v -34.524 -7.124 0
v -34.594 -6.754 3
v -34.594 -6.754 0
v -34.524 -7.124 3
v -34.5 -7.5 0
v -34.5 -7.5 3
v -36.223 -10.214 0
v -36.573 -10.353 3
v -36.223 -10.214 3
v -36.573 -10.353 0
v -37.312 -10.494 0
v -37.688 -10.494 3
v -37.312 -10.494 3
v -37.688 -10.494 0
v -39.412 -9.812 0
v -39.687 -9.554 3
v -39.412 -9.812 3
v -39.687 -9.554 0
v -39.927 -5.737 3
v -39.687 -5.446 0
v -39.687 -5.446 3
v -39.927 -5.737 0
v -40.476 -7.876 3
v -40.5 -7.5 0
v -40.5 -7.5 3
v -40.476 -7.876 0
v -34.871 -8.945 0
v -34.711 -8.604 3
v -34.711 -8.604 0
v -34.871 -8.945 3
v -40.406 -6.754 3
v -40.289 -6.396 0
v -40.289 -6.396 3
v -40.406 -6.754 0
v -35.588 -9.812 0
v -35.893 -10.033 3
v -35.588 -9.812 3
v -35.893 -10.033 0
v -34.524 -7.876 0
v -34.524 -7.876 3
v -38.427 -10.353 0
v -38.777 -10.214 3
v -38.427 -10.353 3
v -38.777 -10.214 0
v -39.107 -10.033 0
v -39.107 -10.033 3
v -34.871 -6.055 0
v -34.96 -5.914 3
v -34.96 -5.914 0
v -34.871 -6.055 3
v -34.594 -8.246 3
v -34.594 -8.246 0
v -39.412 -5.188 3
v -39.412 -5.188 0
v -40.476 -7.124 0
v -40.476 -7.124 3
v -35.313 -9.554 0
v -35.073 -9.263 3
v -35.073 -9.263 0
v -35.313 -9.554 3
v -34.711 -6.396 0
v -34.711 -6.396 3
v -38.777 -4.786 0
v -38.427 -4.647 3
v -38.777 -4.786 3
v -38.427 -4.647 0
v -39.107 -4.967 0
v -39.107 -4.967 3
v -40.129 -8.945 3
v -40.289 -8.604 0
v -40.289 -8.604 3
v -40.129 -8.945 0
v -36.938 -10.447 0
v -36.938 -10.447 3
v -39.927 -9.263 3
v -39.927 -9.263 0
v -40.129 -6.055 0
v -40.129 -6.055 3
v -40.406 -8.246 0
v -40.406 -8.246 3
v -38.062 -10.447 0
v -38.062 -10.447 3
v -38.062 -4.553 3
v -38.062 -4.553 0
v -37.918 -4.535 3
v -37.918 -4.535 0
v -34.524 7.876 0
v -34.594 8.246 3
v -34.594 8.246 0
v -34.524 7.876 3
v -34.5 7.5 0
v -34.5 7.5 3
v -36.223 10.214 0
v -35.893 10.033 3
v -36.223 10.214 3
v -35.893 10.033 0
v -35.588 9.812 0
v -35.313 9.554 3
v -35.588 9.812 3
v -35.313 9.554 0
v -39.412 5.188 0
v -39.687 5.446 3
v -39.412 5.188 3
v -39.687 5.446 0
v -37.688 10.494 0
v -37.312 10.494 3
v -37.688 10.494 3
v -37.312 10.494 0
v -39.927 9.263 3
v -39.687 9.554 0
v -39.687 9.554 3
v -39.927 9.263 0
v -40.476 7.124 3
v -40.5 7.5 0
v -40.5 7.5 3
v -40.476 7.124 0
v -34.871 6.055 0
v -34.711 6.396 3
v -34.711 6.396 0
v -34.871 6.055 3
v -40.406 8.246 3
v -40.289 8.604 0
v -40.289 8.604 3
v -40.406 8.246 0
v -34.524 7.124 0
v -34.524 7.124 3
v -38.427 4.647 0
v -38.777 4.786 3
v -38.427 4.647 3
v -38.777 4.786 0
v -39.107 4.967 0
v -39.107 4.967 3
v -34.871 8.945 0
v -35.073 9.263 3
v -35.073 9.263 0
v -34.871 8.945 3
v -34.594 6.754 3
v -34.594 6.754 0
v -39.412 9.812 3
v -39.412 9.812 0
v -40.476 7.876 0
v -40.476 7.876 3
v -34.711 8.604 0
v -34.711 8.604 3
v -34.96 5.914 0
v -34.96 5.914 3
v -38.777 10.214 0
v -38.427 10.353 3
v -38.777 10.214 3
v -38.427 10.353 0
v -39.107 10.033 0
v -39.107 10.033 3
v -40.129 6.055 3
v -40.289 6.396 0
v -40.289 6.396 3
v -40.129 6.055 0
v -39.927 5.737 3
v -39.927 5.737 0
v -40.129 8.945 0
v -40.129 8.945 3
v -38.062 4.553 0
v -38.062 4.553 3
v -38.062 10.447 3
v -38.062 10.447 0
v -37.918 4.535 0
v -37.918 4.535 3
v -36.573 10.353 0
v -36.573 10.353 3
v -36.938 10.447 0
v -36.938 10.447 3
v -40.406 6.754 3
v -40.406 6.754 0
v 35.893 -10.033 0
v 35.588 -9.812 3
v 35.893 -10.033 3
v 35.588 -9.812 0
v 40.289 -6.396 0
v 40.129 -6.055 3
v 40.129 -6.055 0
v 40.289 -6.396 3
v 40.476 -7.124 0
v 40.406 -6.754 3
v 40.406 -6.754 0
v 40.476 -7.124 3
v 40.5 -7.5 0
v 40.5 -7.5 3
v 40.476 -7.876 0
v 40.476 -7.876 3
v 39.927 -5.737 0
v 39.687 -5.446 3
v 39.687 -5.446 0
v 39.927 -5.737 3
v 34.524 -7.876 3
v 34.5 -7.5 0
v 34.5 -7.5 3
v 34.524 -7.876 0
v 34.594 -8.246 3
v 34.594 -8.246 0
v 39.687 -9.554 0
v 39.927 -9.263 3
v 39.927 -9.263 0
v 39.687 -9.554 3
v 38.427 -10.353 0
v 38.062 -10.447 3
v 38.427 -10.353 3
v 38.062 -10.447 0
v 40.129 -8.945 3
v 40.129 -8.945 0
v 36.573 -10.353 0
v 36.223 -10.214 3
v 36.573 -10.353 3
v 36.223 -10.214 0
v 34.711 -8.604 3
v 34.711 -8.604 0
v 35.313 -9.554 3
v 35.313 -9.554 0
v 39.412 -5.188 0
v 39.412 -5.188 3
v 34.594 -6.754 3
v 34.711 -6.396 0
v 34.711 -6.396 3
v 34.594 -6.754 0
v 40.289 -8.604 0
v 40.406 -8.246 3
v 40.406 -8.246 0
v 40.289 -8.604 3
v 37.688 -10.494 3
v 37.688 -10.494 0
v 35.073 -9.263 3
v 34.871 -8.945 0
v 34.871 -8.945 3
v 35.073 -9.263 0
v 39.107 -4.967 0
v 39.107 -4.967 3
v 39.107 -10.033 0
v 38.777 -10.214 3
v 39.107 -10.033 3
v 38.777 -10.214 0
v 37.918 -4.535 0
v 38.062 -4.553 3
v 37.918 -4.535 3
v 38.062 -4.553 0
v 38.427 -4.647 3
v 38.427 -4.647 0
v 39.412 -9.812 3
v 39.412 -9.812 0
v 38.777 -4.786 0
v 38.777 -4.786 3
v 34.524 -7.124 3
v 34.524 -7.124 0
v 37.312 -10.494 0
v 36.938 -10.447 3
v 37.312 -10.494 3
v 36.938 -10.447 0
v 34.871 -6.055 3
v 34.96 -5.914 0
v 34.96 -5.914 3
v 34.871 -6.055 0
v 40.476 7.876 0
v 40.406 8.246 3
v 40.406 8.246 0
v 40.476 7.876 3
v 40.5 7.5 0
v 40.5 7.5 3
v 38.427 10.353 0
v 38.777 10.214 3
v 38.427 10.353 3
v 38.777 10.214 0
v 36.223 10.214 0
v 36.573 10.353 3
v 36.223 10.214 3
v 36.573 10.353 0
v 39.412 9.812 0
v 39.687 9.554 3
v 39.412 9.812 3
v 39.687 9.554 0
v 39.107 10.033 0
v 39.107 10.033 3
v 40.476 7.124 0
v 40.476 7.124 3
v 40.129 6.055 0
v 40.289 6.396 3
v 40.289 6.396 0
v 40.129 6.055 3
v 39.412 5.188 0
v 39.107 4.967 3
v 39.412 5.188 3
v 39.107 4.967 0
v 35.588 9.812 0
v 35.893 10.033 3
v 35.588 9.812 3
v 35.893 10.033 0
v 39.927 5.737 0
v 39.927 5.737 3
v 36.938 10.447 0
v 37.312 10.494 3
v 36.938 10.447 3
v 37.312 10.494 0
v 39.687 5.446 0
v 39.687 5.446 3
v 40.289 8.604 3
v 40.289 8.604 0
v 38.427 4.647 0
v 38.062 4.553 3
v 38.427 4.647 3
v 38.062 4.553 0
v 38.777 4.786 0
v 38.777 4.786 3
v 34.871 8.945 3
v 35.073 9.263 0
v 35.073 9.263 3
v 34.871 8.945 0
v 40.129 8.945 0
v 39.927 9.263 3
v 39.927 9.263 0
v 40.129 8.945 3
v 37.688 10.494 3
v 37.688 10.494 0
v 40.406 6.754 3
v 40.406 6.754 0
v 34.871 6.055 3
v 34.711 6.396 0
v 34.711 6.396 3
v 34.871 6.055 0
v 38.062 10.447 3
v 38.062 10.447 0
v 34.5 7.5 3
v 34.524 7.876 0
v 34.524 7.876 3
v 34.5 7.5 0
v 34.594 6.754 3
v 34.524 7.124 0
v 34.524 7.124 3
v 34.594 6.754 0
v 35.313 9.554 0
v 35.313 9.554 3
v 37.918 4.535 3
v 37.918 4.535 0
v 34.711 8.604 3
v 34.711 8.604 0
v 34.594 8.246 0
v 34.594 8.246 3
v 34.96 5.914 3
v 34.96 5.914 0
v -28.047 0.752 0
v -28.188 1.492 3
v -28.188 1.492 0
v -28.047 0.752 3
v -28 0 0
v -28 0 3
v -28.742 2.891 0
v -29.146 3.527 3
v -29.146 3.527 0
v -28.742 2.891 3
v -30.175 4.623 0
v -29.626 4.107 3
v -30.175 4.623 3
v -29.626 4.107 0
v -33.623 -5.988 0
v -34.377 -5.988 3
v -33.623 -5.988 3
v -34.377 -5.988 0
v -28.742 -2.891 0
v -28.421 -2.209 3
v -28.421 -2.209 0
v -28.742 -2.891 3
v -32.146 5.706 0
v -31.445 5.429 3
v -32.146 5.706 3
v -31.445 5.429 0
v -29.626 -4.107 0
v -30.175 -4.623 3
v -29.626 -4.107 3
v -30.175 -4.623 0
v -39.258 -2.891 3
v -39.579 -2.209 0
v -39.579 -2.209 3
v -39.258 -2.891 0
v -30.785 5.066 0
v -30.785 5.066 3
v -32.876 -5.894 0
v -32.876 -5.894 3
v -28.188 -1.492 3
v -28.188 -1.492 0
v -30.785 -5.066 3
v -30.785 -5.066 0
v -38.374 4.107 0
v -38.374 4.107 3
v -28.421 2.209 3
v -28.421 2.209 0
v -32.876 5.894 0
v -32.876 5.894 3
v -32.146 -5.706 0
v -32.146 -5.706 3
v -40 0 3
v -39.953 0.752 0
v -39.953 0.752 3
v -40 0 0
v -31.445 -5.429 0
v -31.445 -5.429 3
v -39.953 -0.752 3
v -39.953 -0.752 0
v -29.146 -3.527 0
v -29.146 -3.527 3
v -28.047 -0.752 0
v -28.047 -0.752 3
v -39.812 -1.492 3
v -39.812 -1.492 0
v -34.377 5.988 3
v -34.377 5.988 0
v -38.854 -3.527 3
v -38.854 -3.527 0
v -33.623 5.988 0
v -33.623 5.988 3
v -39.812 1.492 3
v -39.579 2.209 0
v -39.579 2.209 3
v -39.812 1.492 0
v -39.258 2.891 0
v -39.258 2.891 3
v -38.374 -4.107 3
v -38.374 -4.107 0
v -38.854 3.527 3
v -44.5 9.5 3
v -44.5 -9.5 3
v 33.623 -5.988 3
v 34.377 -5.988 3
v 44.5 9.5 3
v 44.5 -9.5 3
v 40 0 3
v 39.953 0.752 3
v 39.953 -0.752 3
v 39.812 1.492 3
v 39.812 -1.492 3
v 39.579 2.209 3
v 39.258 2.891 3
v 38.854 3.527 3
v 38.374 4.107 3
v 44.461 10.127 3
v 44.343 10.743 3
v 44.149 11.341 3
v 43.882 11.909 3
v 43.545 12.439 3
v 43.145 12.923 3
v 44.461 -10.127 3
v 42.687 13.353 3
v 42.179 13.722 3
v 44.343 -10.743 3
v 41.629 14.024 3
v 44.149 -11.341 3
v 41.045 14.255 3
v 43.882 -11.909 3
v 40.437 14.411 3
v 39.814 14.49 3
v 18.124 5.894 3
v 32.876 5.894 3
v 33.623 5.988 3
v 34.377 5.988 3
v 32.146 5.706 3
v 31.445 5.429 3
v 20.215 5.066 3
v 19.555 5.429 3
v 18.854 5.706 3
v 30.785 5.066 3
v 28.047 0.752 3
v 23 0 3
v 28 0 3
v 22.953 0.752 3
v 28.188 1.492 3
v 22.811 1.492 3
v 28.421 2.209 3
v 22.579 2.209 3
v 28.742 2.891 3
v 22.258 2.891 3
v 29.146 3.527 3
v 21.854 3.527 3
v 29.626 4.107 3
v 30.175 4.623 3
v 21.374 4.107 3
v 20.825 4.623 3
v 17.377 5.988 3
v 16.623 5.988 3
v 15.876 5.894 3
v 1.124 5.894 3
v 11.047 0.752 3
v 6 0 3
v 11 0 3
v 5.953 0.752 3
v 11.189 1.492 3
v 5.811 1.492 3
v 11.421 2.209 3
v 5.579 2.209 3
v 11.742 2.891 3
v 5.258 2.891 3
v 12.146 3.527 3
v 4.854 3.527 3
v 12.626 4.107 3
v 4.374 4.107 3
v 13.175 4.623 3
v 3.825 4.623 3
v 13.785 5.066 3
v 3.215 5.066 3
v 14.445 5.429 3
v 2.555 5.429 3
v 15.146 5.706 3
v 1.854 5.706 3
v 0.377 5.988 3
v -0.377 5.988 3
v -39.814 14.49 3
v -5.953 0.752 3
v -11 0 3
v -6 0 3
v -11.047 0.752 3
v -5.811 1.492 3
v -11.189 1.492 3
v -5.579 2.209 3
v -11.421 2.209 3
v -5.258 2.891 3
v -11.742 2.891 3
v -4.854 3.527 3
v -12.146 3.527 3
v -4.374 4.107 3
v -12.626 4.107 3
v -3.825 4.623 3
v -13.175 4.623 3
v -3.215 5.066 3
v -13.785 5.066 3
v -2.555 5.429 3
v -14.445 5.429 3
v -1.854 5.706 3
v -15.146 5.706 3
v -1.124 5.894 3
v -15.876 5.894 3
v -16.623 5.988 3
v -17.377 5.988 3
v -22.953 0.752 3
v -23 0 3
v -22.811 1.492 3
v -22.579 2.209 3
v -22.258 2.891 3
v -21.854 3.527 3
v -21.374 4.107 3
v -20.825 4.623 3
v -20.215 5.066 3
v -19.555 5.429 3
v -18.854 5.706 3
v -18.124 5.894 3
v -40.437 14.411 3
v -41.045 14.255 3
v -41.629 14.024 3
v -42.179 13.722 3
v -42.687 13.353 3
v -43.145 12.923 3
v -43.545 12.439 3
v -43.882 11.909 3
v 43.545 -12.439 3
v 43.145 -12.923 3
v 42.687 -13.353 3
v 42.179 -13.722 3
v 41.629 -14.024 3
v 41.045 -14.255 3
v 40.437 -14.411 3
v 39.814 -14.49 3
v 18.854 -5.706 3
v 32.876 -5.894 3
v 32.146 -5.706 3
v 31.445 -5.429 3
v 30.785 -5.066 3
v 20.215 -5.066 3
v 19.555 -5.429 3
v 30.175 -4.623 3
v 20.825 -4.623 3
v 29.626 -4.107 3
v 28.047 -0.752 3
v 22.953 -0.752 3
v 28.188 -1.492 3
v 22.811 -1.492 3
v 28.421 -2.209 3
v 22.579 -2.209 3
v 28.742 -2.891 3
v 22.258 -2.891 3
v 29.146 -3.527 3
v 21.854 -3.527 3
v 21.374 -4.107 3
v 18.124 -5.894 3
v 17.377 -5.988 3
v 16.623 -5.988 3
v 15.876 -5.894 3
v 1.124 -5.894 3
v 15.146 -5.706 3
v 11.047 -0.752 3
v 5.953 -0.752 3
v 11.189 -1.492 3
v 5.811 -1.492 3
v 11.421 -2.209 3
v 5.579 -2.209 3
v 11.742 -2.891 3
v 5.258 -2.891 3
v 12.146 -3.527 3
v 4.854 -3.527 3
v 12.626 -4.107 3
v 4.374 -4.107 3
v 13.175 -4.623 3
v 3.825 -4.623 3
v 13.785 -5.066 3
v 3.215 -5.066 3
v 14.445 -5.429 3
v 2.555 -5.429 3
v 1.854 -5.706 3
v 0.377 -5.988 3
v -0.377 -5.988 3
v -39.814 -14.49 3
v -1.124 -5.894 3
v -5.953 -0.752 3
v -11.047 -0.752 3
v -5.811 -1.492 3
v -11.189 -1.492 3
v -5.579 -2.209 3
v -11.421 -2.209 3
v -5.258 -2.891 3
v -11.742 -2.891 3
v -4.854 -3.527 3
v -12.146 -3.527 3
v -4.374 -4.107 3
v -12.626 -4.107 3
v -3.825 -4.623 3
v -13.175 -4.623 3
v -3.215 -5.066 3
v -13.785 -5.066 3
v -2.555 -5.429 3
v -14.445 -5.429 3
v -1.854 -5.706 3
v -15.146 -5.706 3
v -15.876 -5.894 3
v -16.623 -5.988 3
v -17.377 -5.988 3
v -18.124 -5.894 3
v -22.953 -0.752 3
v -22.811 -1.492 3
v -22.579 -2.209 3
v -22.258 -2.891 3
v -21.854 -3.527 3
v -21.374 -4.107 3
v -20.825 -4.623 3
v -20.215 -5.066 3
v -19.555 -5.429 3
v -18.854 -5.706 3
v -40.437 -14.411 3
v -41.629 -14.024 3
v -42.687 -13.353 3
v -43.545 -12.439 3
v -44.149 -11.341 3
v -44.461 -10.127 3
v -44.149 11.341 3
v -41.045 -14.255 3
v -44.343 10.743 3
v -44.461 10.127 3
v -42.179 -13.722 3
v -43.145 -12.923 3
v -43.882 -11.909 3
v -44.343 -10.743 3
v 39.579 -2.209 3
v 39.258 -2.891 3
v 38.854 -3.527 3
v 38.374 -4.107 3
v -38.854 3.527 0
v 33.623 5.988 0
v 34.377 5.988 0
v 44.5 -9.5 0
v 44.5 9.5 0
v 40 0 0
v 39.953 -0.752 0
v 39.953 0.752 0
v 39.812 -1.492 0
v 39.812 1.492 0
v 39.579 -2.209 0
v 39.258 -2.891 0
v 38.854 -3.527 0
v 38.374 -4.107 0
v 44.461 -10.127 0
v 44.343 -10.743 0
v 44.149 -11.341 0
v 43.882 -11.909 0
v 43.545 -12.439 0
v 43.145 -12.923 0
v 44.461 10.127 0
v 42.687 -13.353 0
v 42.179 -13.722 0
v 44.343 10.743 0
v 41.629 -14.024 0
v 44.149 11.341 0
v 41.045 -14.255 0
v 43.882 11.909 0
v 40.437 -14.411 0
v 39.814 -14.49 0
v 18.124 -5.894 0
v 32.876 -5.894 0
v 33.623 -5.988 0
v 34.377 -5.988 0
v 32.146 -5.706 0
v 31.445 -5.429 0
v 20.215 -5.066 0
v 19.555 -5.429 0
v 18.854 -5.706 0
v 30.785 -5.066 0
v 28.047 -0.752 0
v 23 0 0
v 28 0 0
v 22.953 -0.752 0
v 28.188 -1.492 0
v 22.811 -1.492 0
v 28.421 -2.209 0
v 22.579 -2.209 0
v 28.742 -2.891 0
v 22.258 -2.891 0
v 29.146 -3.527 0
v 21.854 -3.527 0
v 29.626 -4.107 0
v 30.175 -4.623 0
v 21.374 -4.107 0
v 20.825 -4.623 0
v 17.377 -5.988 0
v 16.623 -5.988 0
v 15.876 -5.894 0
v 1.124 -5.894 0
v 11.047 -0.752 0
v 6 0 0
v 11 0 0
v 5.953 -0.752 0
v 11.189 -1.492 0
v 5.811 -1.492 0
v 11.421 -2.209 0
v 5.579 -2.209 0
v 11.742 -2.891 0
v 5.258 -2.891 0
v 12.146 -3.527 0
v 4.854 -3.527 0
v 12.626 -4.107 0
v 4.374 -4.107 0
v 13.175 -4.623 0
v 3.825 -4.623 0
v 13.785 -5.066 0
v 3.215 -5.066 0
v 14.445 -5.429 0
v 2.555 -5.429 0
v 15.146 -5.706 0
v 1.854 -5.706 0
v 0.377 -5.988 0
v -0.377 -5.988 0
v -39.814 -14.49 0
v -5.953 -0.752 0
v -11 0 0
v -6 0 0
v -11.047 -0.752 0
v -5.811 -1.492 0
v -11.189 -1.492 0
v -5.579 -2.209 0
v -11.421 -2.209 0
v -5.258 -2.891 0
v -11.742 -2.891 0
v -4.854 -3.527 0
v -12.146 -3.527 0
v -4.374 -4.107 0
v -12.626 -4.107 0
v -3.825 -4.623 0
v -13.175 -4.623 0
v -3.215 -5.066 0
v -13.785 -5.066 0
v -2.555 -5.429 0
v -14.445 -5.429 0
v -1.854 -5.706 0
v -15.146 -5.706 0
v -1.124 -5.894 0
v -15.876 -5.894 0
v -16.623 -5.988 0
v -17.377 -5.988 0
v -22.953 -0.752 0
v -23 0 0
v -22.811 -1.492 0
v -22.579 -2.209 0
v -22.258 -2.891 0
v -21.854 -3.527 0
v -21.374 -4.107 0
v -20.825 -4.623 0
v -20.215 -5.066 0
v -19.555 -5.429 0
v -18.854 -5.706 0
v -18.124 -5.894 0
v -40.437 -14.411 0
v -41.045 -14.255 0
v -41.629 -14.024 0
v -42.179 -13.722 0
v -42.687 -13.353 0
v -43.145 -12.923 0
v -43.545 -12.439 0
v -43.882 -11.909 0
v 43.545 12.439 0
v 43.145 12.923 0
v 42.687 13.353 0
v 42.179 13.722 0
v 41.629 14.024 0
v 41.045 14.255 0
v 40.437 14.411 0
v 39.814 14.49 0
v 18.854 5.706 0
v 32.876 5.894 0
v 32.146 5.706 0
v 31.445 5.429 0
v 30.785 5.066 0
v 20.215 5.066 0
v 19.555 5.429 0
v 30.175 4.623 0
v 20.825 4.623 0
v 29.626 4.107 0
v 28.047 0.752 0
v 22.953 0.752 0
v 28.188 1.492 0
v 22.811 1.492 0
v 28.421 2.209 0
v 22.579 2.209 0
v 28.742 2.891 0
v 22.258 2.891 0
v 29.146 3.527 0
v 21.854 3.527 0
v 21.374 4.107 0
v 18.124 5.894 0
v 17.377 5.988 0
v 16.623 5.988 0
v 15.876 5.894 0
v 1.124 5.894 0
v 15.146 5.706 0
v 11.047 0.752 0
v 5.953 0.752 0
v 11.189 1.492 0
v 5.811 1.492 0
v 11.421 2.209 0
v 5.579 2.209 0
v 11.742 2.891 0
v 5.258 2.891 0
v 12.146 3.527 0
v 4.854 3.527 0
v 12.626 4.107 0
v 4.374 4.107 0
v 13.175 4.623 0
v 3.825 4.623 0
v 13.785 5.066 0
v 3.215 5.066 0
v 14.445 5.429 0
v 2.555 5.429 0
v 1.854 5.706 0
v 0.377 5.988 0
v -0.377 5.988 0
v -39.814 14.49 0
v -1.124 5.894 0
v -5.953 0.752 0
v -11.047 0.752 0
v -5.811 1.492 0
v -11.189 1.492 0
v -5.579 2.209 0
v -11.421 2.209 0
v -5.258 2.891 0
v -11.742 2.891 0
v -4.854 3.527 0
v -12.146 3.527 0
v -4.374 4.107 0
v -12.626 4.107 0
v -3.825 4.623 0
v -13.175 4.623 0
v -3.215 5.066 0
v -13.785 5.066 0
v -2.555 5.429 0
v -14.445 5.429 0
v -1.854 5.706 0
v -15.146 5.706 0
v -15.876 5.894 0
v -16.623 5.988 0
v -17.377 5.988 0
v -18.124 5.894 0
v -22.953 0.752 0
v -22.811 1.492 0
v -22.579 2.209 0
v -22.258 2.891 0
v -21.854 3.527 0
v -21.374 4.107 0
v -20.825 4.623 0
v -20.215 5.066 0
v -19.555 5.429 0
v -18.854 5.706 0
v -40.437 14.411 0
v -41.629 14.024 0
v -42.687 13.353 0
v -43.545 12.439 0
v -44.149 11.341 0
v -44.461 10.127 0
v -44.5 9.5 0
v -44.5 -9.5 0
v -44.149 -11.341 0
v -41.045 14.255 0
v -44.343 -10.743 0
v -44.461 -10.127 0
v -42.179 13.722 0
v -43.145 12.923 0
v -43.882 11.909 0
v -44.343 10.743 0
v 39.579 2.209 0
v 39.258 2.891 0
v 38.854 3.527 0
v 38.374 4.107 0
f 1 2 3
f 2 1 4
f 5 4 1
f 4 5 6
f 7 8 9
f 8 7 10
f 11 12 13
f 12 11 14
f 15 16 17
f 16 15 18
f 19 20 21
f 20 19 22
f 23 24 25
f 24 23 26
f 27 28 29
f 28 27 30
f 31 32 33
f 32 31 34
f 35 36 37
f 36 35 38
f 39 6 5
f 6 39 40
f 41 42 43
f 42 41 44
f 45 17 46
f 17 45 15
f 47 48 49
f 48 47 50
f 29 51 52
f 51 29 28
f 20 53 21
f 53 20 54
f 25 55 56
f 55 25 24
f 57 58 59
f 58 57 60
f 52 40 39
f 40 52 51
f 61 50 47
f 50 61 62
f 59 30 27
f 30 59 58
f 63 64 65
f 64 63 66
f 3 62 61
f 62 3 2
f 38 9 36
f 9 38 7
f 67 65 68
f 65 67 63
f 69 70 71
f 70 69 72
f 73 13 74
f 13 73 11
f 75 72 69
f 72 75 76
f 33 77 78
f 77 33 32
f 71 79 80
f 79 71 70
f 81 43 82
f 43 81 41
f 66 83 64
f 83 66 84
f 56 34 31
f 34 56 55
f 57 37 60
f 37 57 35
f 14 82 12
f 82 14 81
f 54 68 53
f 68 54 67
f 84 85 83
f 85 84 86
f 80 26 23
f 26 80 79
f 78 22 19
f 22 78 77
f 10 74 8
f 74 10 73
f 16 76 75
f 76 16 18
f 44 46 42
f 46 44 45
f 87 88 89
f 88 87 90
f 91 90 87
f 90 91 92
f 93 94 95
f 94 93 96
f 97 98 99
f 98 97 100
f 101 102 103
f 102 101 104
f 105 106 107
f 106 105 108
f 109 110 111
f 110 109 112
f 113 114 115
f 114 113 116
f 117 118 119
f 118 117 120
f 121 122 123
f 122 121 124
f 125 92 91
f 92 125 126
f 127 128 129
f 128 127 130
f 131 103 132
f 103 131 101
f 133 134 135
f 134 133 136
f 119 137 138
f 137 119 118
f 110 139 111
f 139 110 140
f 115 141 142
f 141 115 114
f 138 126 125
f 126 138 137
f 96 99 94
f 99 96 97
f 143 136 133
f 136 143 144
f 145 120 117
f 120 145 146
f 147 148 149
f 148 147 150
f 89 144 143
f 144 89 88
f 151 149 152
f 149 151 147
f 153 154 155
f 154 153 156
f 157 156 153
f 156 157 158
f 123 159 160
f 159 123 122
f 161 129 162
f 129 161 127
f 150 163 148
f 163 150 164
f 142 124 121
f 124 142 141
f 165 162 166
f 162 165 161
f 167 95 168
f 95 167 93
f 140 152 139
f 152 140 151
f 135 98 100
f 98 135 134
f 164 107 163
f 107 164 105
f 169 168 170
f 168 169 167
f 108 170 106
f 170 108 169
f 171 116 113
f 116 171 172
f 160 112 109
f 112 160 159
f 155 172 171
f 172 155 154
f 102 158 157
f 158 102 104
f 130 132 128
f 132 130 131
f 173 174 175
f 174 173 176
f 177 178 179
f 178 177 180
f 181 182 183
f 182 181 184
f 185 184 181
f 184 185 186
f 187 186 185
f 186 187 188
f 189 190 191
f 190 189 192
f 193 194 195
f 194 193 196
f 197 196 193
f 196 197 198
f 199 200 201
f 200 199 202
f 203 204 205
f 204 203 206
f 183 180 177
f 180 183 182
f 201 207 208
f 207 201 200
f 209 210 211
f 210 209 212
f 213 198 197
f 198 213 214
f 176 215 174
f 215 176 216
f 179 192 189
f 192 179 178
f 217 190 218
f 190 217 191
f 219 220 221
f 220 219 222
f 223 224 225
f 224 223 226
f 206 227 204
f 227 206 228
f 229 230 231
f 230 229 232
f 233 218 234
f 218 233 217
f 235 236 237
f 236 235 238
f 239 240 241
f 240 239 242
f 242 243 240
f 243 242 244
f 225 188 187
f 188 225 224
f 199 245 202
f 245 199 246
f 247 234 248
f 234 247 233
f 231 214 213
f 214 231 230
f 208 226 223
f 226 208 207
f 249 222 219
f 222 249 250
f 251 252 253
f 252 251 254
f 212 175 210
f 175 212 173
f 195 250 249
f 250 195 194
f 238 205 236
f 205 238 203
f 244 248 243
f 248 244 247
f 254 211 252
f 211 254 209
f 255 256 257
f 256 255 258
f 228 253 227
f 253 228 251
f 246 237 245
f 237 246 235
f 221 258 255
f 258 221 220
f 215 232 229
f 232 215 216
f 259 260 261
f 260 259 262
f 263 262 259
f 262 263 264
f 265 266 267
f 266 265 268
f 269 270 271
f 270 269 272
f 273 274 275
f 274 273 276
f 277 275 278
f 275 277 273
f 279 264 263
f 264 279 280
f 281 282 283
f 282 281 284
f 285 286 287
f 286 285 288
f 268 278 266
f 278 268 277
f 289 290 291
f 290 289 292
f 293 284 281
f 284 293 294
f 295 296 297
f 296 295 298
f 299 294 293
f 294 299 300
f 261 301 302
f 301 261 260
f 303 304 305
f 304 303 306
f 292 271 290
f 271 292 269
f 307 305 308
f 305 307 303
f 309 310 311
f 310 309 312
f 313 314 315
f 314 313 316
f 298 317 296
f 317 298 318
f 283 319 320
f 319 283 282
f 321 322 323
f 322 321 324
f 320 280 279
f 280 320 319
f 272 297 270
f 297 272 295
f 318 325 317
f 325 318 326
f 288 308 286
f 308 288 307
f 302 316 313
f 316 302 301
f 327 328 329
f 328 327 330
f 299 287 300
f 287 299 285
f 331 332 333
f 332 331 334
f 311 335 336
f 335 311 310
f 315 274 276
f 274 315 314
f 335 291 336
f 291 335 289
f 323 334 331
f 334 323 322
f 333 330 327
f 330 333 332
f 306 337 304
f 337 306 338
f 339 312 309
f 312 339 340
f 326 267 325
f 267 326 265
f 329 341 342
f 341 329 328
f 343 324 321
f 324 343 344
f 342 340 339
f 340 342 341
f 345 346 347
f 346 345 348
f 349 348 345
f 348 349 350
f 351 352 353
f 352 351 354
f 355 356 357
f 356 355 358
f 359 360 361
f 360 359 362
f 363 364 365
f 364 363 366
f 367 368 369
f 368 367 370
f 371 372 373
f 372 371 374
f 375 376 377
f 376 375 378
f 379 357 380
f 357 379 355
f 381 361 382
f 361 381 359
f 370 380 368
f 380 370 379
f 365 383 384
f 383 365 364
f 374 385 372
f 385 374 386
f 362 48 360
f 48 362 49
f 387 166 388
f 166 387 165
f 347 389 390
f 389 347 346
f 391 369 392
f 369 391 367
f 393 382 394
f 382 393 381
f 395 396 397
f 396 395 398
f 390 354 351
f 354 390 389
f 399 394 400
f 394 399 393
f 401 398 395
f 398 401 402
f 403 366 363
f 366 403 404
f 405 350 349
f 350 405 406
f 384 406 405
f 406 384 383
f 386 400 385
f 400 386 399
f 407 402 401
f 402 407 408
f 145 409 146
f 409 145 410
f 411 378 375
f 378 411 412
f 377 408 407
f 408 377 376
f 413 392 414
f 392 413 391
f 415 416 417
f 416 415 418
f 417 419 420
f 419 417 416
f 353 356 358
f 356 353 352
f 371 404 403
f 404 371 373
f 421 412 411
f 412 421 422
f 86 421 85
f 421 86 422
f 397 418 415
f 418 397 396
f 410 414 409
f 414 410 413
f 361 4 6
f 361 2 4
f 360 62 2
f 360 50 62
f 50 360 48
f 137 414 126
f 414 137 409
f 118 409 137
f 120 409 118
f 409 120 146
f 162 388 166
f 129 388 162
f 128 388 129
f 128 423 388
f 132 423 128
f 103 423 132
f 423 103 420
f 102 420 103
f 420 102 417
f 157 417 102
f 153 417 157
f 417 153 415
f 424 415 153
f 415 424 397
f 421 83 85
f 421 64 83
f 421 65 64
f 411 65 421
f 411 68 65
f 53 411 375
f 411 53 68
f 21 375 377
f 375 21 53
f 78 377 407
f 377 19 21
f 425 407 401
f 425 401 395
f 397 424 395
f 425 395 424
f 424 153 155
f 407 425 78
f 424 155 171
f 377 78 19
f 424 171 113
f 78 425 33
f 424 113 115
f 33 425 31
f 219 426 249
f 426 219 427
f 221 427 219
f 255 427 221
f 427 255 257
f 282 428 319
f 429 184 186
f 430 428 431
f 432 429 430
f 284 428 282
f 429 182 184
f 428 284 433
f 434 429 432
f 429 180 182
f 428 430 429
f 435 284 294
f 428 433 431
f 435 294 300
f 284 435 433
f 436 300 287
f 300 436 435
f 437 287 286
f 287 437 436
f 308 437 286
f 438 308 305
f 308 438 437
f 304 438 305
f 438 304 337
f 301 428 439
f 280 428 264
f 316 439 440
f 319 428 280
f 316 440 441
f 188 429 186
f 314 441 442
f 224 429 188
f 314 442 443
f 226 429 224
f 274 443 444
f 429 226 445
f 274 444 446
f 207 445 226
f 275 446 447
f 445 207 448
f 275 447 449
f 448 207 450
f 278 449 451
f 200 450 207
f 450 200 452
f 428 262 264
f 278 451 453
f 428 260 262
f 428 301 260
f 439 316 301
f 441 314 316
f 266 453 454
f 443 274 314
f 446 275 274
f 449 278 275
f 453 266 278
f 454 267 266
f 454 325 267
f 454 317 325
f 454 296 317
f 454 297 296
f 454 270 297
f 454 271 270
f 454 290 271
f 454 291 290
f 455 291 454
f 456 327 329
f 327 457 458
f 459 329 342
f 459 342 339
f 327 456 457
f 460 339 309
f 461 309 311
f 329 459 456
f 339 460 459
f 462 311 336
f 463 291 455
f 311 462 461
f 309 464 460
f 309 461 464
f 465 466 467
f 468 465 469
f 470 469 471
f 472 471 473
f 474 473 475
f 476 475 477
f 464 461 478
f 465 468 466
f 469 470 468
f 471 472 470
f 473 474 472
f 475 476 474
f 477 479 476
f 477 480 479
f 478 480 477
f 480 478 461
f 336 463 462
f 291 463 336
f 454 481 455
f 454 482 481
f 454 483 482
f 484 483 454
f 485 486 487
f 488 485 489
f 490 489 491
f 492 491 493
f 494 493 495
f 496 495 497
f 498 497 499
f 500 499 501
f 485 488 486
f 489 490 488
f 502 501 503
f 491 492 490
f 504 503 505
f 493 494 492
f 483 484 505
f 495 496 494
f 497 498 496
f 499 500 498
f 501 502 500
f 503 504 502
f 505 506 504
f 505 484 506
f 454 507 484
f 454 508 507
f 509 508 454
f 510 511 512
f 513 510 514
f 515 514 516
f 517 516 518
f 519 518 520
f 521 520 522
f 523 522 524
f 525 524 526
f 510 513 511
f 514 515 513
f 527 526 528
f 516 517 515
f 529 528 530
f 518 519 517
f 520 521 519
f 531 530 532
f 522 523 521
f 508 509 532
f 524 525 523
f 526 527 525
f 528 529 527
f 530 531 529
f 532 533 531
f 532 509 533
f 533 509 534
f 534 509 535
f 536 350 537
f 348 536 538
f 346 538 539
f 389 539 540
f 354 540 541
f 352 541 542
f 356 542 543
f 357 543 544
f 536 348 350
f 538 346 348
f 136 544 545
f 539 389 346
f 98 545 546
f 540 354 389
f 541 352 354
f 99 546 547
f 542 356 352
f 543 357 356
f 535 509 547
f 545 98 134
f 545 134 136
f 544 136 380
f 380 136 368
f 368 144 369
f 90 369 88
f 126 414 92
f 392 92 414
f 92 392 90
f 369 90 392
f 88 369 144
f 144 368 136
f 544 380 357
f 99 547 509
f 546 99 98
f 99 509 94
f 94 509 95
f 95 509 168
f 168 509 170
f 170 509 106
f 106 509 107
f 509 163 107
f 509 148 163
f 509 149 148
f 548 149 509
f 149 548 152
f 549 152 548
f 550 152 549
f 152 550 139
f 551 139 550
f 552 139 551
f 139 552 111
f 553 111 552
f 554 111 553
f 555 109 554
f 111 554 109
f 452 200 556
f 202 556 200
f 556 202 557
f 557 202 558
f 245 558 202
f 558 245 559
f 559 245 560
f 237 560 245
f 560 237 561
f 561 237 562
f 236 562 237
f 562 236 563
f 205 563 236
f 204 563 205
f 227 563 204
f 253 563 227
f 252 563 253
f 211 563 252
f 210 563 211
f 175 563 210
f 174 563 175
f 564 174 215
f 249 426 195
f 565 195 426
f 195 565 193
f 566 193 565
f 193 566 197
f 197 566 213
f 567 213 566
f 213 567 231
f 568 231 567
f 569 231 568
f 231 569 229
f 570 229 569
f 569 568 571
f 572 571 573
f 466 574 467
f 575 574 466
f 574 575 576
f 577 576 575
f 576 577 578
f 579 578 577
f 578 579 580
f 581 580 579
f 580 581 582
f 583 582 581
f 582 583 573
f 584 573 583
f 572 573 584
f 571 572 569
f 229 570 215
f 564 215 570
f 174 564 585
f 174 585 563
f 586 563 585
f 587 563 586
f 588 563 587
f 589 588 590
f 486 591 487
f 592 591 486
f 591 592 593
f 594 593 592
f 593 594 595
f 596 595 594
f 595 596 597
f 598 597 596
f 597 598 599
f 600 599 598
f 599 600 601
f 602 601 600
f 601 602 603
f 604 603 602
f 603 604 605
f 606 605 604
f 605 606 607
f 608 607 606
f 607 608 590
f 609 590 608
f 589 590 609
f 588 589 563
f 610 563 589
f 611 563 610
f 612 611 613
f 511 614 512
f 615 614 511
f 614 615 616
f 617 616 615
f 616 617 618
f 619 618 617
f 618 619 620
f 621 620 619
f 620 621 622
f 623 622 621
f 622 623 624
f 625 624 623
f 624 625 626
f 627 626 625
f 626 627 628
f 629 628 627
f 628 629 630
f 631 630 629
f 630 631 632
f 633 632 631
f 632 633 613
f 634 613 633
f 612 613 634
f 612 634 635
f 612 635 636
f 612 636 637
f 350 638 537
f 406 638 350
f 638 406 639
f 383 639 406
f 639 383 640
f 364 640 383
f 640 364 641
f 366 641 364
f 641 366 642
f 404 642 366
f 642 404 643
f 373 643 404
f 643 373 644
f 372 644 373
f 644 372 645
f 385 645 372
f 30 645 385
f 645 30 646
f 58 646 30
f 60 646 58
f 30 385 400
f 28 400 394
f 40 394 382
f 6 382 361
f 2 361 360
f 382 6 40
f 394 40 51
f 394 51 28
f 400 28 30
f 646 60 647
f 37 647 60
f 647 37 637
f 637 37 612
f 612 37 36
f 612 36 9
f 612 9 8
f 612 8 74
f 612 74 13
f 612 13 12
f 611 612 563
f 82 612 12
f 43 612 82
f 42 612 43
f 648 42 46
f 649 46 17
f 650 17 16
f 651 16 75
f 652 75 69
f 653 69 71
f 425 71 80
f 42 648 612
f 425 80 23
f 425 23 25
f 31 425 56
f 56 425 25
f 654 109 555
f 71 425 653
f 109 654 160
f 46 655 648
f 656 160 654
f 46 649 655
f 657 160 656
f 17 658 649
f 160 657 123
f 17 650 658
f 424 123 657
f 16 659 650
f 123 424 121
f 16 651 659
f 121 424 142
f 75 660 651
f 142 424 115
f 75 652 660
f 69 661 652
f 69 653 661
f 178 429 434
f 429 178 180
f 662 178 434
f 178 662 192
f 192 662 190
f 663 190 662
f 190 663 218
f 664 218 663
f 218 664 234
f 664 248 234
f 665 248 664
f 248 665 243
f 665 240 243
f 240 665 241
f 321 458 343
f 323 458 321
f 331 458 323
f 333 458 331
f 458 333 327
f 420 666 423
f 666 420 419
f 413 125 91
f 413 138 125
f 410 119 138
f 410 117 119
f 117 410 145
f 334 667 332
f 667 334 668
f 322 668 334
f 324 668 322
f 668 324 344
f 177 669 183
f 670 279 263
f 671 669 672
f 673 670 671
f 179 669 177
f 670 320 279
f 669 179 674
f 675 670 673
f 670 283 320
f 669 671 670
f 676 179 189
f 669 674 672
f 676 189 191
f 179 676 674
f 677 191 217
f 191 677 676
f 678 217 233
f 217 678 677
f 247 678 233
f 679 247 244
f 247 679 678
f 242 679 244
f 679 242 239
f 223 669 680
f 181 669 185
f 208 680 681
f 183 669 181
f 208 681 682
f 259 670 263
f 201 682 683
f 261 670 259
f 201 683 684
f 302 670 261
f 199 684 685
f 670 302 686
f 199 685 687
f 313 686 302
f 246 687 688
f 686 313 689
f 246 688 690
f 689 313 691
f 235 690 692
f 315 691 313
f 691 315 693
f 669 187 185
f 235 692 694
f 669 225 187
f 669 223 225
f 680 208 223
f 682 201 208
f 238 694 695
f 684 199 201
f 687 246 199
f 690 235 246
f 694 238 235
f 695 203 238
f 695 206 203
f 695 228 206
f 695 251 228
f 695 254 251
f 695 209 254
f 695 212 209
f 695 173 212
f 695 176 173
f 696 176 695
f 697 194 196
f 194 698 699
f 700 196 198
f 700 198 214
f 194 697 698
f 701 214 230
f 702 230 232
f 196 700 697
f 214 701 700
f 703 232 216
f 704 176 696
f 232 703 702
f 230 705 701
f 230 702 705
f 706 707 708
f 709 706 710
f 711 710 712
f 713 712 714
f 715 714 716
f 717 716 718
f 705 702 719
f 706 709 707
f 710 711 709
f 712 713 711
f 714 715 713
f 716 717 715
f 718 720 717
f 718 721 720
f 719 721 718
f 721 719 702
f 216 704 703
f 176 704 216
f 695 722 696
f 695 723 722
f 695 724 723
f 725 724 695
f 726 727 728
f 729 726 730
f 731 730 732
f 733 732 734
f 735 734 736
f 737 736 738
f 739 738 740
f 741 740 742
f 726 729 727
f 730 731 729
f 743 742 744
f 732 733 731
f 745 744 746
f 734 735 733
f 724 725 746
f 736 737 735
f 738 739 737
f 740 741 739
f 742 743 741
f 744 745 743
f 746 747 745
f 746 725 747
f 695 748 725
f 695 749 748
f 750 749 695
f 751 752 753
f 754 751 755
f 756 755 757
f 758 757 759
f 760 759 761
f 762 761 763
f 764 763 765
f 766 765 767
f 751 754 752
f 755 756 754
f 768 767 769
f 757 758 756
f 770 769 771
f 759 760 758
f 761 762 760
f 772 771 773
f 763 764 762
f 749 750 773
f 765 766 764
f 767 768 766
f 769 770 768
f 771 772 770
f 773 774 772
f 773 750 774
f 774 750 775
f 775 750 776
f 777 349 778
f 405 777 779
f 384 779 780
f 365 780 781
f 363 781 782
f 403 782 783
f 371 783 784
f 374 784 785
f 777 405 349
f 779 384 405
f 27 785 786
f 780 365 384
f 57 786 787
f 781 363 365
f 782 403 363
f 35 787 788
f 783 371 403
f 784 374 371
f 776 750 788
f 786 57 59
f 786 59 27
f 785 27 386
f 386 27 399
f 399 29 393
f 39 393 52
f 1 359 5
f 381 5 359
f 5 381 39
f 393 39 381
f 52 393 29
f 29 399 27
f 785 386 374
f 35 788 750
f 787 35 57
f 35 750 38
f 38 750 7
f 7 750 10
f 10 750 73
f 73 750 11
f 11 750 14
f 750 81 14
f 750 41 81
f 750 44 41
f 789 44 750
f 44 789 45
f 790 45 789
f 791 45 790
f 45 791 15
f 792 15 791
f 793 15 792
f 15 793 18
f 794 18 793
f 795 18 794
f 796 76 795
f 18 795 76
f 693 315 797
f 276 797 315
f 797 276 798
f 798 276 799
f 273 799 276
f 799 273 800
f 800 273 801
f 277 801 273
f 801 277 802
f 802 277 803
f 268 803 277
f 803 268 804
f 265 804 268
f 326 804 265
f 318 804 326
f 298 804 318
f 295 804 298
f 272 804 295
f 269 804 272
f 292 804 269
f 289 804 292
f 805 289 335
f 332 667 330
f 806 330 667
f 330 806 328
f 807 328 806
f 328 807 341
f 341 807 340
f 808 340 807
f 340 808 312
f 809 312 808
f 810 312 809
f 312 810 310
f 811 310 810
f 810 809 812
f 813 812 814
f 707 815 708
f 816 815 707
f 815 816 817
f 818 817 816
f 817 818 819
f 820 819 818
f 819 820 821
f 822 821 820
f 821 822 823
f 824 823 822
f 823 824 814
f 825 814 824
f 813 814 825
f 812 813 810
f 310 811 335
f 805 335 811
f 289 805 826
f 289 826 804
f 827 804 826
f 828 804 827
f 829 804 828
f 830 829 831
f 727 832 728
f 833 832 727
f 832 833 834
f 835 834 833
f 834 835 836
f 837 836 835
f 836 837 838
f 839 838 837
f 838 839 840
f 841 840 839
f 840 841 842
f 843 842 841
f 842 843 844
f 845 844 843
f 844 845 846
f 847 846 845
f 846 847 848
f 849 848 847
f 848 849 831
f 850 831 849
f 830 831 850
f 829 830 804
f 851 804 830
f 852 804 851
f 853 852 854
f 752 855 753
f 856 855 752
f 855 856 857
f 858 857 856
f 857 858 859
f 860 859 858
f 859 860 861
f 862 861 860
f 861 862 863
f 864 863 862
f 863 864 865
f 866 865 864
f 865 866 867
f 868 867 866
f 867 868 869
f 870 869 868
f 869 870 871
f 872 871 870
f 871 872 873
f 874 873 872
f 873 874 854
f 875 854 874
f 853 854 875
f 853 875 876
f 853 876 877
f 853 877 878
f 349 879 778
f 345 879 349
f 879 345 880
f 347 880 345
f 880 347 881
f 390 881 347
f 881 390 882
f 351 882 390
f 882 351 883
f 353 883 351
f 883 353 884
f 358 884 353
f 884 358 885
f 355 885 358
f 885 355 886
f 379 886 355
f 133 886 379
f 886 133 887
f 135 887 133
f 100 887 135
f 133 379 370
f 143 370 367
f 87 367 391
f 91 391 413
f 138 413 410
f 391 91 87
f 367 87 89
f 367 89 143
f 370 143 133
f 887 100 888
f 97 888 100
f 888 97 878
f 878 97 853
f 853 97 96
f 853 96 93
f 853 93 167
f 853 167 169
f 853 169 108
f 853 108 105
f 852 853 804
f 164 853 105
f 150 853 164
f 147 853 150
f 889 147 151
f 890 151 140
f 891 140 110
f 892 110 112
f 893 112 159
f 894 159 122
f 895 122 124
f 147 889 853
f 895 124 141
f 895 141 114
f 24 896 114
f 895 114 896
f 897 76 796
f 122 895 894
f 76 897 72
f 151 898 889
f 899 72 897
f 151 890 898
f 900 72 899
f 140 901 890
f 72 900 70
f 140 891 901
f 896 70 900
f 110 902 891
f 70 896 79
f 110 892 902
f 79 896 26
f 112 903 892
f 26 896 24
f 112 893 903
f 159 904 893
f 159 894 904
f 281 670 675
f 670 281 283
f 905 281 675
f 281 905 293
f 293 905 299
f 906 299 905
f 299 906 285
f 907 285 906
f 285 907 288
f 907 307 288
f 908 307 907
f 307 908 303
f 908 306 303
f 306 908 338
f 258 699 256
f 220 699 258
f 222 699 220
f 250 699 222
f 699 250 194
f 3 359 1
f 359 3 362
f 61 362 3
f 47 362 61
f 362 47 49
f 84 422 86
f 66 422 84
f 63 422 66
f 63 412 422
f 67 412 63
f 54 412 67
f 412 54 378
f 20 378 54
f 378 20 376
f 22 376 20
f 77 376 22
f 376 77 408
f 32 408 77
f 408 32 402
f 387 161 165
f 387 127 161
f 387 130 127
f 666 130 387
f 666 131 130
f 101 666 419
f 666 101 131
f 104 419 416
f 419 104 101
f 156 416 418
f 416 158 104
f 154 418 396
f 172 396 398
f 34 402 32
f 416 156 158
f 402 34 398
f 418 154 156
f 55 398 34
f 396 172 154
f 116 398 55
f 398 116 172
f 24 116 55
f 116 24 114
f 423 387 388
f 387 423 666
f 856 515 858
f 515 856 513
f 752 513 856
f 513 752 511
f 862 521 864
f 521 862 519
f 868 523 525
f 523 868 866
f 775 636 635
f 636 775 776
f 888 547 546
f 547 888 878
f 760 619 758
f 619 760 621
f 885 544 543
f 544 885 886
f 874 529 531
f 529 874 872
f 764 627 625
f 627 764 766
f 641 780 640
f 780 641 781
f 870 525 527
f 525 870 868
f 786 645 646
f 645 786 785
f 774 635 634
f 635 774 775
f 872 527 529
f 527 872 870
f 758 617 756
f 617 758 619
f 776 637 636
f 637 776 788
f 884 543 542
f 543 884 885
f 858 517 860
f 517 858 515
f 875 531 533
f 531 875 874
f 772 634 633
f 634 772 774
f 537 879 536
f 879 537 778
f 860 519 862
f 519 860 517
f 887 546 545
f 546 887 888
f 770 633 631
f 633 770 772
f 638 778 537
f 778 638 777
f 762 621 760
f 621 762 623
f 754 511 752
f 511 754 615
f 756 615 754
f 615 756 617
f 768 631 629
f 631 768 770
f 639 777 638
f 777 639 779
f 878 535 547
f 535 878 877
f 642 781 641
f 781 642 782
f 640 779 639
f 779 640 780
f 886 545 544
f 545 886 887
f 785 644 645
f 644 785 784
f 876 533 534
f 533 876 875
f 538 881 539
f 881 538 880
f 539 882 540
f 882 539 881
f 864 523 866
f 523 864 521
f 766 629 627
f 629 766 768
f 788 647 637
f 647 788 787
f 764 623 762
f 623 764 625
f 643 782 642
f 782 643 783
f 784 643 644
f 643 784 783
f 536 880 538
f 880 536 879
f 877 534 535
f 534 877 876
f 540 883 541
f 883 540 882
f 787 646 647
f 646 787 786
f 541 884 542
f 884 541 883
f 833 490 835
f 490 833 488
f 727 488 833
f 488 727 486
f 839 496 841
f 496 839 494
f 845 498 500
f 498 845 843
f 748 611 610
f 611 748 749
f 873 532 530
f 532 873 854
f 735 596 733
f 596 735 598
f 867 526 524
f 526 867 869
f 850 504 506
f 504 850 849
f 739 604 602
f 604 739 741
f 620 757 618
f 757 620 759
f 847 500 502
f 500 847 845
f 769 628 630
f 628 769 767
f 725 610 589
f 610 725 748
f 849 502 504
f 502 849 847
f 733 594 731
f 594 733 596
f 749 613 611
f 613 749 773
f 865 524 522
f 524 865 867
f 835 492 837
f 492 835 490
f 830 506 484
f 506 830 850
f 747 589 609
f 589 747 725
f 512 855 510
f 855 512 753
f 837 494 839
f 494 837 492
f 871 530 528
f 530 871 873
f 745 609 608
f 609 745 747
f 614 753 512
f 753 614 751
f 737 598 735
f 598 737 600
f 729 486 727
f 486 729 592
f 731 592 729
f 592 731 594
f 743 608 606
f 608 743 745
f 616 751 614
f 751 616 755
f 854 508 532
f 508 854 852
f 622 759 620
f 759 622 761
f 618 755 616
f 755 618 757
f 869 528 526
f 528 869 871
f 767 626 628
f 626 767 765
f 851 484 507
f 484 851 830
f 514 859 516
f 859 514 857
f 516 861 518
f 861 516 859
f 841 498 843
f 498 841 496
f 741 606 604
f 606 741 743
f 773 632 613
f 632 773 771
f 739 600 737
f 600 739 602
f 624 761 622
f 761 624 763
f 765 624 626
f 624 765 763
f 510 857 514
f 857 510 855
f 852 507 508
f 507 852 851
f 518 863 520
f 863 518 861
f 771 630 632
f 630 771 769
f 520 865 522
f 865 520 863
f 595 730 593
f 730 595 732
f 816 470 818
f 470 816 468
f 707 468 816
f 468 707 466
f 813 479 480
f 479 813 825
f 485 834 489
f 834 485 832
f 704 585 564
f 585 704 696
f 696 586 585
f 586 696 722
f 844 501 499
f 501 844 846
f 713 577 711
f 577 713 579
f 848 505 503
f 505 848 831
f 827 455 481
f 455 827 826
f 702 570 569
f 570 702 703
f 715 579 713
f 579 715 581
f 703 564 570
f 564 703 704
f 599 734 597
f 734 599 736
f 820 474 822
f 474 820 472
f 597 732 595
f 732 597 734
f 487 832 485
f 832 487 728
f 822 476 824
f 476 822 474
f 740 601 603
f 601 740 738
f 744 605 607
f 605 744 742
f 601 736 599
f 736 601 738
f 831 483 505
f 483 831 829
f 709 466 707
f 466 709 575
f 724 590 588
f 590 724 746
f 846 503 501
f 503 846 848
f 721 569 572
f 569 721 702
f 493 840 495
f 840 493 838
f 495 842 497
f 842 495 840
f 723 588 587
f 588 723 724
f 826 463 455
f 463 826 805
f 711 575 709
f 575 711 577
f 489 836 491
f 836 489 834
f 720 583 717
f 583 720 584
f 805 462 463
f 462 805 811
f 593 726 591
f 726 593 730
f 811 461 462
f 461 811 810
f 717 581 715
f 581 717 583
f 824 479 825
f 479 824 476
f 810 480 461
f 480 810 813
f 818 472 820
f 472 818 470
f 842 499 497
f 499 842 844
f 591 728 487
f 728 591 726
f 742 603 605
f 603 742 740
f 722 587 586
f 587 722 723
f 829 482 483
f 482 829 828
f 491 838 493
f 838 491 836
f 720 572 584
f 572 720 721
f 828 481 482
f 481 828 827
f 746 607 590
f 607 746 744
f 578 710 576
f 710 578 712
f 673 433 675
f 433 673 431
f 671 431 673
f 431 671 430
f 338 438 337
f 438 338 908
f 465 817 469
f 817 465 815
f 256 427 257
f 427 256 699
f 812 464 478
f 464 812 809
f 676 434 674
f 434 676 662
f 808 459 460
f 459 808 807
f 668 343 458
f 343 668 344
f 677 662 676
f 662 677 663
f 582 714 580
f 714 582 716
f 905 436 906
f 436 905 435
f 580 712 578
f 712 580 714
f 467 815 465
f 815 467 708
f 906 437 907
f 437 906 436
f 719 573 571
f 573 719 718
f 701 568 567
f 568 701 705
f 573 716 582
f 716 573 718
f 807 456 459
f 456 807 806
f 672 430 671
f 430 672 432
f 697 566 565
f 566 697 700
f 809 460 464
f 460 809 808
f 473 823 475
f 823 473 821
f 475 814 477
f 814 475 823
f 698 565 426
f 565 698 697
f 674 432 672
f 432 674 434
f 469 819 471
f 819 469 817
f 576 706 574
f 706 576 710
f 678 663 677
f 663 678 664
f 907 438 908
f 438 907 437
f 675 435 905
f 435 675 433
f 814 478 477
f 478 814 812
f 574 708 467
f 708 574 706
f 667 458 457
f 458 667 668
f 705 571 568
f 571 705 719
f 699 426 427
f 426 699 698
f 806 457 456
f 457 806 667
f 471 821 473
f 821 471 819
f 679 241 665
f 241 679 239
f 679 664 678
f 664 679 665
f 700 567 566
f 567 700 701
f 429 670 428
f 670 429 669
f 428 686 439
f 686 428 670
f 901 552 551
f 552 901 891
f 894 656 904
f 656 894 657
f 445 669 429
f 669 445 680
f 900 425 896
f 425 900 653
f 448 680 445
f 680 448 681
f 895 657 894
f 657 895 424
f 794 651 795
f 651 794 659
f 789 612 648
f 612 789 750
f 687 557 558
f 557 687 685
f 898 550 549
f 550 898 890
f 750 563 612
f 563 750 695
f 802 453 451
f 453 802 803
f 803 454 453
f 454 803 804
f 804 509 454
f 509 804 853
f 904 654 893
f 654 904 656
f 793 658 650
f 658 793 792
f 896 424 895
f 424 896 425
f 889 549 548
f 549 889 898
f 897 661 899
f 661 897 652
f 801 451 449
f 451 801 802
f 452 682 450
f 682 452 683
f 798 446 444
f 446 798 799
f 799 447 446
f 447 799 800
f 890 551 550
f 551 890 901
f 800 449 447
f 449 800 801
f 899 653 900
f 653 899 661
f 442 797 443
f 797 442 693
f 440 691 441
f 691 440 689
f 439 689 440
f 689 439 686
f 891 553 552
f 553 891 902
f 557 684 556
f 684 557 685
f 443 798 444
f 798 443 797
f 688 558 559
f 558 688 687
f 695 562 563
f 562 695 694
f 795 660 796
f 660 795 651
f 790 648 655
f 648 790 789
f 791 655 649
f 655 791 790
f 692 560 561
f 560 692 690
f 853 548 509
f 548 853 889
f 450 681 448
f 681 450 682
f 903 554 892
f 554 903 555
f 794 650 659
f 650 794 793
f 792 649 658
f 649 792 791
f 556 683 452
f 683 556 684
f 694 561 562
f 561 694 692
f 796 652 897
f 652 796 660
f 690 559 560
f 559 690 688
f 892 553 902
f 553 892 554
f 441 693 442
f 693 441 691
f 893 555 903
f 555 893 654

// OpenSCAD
$fn = 50;


difference() {
	union() {
		hull() {
			translate(v = [-39.5000000000, 9.5000000000, 0]) {
				cylinder(h = 3, r = 5);
			}
			translate(v = [39.5000000000, 9.5000000000, 0]) {
				cylinder(h = 3, r = 5);
			}
			translate(v = [-39.5000000000, -9.5000000000, 0]) {
				cylinder(h = 3, r = 5);
			}
			translate(v = [39.5000000000, -9.5000000000, 0]) {
				cylinder(h = 3, r = 5);
			}
		}
	}
	union() {
		#translate(v = [-37.5000000000, -7.5000000000, -100.0000000000]) {
			cylinder(h = 200, r = 3.0000000000);
		}
		#translate(v = [-37.5000000000, 7.5000000000, -100.0000000000]) {
			cylinder(h = 200, r = 3.0000000000);
		}
		#translate(v = [37.5000000000, -7.5000000000, -100.0000000000]) {
			cylinder(h = 200, r = 3.0000000000);
		}
		#translate(v = [37.5000000000, 7.5000000000, -100.0000000000]) {
			cylinder(h = 200, r = 3.0000000000);
		}
		#translate(v = [-34.0000000000, 0, 0]) {
			cylinder(h = 3, r = 6.0000000000);
		}
		#translate(v = [-17.0000000000, 0, 0]) {
			cylinder(h = 3, r = 6.0000000000);
		}
		#cylinder(h = 3, r = 6.0000000000);
		#translate(v = [17.0000000000, 0, 0]) {
			cylinder(h = 3, r = 6.0000000000);
		}
		#translate(v = [34.0000000000, 0, 0]) {
			cylinder(h = 3, r = 6.0000000000);
		}
	}
}
